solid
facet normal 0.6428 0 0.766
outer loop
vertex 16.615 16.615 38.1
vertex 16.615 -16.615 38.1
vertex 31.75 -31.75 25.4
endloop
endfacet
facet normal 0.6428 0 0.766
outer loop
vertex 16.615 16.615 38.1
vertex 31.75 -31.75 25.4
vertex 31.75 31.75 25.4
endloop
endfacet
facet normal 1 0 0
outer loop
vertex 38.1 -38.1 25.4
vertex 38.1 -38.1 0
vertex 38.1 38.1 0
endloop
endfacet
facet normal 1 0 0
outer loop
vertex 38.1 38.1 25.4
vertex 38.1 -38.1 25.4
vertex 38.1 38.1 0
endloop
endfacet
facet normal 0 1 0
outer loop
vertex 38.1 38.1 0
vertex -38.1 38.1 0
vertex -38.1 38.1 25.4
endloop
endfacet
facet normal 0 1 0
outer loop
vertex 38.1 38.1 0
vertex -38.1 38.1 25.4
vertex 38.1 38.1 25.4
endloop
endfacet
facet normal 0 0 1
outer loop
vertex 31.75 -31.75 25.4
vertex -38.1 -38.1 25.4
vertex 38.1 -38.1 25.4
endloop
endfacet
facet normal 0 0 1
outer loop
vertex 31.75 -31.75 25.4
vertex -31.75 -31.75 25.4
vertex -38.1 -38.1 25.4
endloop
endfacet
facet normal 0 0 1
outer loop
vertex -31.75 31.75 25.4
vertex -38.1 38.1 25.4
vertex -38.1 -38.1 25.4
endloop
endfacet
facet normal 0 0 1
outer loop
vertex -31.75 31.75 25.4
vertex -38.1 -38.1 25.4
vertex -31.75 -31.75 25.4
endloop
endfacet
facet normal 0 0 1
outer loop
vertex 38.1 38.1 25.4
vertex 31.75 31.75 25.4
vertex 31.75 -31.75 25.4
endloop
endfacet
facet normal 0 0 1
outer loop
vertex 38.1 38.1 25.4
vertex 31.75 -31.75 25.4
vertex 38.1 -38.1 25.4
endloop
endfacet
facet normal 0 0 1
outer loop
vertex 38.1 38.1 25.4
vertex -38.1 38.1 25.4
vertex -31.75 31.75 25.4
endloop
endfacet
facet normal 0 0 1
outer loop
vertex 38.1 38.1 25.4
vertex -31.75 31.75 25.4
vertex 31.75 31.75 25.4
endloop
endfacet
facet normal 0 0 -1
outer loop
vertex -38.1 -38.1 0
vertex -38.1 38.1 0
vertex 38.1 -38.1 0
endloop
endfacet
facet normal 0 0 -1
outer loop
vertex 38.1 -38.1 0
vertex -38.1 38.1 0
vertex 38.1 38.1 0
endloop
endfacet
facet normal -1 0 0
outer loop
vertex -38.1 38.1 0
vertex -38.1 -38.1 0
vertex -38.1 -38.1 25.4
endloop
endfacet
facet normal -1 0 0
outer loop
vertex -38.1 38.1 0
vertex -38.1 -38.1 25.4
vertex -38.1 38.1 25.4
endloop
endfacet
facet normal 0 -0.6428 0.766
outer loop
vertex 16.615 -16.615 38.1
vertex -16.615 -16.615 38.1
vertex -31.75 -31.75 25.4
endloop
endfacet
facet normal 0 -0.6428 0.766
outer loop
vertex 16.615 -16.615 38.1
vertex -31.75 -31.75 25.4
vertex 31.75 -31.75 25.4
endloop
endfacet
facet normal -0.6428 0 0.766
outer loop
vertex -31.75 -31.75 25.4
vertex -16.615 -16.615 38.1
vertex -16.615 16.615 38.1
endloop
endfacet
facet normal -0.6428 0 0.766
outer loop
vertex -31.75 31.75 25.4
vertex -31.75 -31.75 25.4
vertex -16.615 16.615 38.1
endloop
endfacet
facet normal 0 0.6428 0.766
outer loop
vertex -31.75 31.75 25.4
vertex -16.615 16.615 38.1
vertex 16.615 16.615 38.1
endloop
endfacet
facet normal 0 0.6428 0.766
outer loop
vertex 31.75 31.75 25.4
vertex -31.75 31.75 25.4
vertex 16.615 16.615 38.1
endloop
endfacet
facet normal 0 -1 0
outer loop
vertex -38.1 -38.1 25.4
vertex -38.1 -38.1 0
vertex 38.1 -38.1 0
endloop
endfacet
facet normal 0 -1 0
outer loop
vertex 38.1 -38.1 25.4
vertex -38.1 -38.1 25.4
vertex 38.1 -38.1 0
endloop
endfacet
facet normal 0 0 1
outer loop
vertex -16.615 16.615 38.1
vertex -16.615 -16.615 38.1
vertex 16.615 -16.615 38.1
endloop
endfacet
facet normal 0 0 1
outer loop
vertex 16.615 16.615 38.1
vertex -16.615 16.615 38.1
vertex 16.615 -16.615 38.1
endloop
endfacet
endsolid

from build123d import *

# Parameters (mm, degrees)
F0_W     = 76.2
F0_H     = 76.2
F1_DEPTH = 25.4
F2_W     = 63.5
F2_H     = 63.5
F3_DEPTH = 12.7
F4_SIZE2 = 15.135261
F4_SIZE  = 12.69999


# Not quite as in the source:
# - a fillet or chamfer is up to 0.001 mm smaller than in the source, because OpenCascade refuses the exact size


with BuildPart() as f1:
    # F0 (on Top) → F1 (new body)
    with BuildSketch(Plane.XY):
        Rectangle(F0_W, F0_H)
    extrude(amount=F1_DEPTH)

    # F2 (on face) → F3 (join)
    with BuildSketch(Plane.XY.offset(25.4)):
        Rectangle(F2_W, F2_H)
    extrude(amount=F3_DEPTH)

    # F4 (size 12.7 and 15.1352706259 in the source; OpenCascade refuses exactly that, so slightly less here)
    f4_edges = [f1.edges().sort_by_distance(p)[0] for p in [
        (0, -31.75, 38.1),
        (-31.75, 0, 38.1),
        (0, 31.75, 38.1),
        (31.75, 0, 38.1),
    ]]
    chamfer(f4_edges, length=F4_SIZE, length2=F4_SIZE2)


solid = f1.part
